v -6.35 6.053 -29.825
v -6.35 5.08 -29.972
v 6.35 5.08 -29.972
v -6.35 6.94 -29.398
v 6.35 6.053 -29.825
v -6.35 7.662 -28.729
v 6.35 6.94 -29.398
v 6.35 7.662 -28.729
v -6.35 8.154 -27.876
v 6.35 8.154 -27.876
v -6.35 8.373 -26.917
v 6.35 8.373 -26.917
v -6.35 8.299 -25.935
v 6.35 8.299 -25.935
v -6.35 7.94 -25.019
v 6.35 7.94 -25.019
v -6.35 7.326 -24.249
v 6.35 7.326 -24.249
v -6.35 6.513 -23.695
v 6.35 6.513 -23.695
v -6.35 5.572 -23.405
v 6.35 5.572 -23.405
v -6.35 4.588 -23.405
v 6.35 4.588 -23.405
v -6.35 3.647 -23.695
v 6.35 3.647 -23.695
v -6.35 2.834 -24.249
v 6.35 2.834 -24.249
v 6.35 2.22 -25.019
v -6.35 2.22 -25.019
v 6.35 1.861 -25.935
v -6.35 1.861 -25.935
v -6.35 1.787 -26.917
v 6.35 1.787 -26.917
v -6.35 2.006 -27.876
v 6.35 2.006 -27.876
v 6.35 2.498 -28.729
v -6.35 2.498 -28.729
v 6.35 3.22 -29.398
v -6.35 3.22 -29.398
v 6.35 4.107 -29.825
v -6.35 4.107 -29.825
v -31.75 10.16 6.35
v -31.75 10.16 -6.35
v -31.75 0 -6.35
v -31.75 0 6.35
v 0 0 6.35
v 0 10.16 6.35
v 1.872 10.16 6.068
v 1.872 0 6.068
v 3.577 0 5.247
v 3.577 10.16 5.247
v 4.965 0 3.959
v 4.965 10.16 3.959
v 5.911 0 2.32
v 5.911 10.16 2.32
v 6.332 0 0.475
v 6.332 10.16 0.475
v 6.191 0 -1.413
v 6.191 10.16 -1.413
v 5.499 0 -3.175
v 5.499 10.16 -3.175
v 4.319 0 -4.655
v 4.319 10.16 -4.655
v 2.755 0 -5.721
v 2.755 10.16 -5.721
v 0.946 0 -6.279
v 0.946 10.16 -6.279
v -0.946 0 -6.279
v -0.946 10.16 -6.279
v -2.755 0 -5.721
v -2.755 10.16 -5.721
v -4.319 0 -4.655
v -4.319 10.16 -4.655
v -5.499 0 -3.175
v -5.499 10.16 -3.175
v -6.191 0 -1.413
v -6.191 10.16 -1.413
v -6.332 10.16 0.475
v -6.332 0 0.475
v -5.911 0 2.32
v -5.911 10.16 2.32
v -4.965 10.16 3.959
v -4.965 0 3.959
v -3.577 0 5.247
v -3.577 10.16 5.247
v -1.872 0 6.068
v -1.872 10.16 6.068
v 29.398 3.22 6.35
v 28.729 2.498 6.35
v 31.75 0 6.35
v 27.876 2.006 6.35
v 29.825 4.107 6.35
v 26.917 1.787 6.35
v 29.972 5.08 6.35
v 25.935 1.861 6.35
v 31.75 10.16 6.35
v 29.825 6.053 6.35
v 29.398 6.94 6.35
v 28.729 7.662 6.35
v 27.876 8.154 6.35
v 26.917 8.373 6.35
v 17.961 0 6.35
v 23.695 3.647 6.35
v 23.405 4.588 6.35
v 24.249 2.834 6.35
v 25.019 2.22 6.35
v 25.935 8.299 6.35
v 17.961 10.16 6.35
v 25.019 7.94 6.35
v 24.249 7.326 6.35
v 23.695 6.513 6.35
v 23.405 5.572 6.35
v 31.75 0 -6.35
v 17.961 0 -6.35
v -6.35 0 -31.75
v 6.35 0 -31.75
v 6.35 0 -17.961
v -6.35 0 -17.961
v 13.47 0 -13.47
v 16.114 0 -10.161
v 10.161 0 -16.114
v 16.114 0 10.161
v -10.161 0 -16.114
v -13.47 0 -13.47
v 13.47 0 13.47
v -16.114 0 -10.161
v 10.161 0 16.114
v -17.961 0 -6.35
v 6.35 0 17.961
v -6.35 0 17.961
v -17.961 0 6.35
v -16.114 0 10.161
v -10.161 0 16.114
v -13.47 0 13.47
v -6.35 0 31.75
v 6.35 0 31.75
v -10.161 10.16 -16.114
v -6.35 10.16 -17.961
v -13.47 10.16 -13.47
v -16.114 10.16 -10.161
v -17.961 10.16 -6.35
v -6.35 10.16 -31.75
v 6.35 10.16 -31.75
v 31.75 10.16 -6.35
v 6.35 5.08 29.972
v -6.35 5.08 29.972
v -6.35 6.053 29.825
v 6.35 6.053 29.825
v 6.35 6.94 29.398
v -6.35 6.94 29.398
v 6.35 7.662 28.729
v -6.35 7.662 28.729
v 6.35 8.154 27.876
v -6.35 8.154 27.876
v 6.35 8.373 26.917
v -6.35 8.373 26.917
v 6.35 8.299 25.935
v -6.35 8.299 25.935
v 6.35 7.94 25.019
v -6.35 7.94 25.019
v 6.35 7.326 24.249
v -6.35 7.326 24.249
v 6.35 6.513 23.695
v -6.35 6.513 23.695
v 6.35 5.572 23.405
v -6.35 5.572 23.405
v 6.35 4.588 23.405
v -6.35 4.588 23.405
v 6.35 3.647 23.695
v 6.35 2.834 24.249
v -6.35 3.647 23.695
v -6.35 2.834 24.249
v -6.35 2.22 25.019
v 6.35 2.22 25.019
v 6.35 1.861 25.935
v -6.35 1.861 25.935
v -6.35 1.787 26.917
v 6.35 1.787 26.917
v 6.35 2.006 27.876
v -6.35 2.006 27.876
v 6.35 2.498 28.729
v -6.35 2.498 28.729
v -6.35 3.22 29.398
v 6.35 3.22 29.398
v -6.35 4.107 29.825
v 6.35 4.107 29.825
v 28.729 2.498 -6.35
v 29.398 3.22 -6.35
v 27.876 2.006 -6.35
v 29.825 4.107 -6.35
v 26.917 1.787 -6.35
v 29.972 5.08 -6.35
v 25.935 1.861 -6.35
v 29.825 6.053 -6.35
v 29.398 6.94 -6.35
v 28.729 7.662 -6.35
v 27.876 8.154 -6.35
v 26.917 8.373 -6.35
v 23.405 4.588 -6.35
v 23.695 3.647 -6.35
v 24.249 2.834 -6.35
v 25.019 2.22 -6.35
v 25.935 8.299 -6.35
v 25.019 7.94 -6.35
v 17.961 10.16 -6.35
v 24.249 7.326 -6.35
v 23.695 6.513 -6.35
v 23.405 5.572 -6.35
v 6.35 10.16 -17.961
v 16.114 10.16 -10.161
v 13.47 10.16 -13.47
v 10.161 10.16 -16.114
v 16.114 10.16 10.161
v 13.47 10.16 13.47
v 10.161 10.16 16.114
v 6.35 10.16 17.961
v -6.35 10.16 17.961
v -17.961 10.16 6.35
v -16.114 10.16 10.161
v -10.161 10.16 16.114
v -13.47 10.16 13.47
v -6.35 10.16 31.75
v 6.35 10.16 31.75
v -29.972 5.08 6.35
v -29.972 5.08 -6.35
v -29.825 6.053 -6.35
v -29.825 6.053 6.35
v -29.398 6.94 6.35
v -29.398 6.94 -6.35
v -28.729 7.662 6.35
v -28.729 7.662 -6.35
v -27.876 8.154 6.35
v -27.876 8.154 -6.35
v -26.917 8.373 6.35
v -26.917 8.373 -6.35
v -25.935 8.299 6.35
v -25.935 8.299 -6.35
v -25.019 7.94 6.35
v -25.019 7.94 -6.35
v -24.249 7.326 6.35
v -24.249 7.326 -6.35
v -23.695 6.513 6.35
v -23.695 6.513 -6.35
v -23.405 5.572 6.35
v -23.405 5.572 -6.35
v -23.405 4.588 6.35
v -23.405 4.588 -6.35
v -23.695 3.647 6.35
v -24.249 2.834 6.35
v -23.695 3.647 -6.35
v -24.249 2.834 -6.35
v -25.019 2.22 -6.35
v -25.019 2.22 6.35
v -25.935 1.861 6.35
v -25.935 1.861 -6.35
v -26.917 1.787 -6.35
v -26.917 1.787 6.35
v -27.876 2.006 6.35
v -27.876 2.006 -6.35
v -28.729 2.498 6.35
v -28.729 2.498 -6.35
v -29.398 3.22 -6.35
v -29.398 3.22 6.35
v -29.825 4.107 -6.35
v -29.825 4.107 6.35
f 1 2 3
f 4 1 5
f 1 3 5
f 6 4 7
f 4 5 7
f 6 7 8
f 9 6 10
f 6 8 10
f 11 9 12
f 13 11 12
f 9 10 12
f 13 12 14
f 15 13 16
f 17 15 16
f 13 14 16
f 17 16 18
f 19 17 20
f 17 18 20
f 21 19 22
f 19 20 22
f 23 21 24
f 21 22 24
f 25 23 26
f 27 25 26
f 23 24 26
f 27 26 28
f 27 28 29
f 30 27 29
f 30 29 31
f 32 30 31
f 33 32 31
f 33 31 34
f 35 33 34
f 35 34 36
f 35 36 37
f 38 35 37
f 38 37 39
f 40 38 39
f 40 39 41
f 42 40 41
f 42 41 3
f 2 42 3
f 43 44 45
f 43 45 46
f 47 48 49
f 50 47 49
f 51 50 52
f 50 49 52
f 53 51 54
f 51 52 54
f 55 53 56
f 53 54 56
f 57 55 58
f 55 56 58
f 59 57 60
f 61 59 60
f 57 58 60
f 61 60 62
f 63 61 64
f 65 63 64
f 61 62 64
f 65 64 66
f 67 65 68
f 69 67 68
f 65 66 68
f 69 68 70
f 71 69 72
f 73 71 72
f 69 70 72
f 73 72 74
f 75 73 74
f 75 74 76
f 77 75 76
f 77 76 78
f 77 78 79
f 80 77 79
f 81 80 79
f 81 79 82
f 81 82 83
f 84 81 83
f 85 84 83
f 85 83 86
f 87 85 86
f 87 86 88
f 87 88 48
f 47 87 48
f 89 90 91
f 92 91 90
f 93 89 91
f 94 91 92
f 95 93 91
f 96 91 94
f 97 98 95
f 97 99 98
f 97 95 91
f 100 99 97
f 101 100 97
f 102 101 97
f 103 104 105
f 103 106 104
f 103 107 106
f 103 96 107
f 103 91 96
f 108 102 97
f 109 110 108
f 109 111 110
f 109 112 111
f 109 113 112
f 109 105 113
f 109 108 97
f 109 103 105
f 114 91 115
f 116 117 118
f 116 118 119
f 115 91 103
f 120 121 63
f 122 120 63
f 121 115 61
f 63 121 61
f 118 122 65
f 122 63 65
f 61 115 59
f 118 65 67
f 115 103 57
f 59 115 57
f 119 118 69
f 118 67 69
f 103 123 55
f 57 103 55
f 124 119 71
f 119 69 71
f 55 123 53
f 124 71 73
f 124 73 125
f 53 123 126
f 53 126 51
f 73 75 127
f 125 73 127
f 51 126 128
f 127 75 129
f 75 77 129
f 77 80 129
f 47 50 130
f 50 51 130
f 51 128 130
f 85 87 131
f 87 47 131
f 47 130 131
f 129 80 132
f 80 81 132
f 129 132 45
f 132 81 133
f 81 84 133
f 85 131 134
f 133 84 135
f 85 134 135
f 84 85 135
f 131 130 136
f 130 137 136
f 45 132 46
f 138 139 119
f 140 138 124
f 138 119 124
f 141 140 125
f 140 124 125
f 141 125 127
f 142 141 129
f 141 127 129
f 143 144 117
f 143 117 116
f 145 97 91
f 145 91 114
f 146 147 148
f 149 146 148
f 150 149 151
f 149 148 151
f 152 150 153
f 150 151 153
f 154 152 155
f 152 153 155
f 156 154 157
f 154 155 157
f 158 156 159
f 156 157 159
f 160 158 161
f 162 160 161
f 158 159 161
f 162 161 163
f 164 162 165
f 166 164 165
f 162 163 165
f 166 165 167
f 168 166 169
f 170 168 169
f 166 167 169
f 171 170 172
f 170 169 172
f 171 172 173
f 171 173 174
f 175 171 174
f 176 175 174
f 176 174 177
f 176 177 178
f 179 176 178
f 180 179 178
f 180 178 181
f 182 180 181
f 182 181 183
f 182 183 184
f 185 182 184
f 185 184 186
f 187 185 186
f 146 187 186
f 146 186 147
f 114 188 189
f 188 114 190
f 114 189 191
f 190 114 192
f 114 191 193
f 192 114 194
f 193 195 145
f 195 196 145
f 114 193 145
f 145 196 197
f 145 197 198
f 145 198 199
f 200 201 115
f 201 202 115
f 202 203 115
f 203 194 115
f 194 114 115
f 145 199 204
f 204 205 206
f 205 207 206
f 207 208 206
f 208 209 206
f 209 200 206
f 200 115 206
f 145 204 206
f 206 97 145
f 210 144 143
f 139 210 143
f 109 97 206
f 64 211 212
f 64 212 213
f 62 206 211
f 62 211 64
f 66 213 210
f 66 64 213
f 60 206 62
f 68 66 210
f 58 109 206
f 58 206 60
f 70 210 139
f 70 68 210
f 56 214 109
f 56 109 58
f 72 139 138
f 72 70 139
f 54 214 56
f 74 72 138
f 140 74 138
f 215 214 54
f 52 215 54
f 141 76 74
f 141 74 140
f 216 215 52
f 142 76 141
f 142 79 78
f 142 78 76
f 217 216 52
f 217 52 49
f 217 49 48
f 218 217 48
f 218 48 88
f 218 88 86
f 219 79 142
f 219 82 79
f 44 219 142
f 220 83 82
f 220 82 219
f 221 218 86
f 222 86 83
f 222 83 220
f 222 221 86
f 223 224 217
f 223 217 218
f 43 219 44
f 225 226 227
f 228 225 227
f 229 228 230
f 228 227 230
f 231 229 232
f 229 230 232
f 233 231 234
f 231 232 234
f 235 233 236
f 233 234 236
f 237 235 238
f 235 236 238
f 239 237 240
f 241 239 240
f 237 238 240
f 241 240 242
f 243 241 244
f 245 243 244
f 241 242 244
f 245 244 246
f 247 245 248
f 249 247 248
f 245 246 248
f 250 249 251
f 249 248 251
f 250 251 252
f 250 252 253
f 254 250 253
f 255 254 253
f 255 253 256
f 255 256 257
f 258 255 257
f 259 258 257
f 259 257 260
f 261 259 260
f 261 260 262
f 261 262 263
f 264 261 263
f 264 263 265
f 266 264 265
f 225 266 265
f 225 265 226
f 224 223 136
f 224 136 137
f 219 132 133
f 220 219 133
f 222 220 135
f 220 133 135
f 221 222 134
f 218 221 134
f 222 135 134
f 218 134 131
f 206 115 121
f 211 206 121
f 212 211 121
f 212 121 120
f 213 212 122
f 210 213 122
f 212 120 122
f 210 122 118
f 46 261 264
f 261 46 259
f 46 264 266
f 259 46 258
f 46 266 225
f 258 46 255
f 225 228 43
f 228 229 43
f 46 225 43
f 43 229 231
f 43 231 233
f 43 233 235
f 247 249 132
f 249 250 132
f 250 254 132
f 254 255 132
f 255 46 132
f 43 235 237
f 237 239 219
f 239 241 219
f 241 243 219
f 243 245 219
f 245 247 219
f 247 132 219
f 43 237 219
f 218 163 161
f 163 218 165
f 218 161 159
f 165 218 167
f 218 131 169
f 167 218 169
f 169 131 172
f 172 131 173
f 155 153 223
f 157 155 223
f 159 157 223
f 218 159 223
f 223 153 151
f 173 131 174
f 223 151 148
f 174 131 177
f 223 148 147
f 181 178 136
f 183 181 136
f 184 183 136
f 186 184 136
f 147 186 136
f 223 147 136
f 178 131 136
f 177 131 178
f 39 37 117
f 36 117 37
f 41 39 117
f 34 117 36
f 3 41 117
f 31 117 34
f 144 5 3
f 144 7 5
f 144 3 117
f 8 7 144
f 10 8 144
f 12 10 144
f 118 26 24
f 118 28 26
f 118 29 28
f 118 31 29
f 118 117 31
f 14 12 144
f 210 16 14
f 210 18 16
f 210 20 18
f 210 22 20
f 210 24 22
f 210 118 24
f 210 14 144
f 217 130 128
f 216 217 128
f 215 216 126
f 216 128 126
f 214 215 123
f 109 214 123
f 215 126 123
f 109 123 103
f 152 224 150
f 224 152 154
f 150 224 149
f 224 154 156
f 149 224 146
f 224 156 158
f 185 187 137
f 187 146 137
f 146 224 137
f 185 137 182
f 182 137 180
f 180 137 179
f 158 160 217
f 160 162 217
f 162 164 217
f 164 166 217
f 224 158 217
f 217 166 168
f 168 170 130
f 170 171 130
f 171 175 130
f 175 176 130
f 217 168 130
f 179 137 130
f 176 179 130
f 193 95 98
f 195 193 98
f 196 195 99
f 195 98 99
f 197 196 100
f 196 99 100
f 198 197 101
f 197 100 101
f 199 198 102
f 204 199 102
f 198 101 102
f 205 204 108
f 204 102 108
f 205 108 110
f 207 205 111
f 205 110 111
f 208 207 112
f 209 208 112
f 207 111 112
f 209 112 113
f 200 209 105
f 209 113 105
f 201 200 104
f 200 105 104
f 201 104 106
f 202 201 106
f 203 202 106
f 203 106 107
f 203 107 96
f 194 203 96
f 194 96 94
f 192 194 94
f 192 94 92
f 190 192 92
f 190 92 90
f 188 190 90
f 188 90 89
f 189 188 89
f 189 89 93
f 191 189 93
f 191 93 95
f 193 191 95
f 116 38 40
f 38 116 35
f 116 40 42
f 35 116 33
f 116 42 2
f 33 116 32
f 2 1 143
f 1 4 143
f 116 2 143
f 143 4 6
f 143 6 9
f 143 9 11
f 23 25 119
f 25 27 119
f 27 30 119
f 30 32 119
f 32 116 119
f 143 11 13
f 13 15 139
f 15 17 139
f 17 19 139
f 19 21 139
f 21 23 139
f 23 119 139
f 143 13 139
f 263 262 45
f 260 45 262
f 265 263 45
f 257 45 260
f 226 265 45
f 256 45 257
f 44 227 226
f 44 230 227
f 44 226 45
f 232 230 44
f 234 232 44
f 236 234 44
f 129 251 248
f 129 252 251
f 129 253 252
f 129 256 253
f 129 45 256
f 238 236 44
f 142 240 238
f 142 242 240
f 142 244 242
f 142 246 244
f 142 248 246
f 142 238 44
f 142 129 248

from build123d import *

# Parameters (mm, degrees)
SKETCH1_R               = 19.05
BOSS_EXTRUDE1_DEPTH     = 10.16
SKETCH2_R               = 6.35
CUT_EXTRUDE1_DEPTH      = 15.494
SKETCH6_W               = 12.7
SKETCH6_H               = 12.7
BOSS_EXTRUDE6_DEPTH     = 10.16
BOSS_EXTRUDE7_START     = -10.16
BOSS_EXTRUDE7_DEPTH     = 10.16
CIRPATTERN7_START       = -6.35
CIRPATTERN7_OUTLINE_W   = 10.16
CIRPATTERN7_OUTLINE_H   = 12.7
CIRPATTERN7_DEPTH       = 12.7
CIRPATTERN7_START_2     = -19.05
CIRPATTERN7_2_OUTLINE_W = 10.16
CIRPATTERN7_2_OUTLINE_H = 12.7
CIRPATTERN7_2_DEPTH     = 1.089487758
CIRPATTERN7_START_3     = 17.960512242
CIRPATTERN7_3_OUTLINE_W = 10.16
CIRPATTERN7_3_OUTLINE_H = 12.7
CIRPATTERN7_3_DEPTH     = 1.089487758
SKETCH7_W               = 12.7
SKETCH7_H               = 10.16
BOSS_EXTRUDE9_DEPTH     = 12.7
SKETCH10_W              = 12.7
SKETCH10_H              = 10.16
BOSS_EXTRUDE10_DEPTH    = 12.7
SKETCH11_W              = 12.7
SKETCH11_H              = 10.16
BOSS_EXTRUDE11_DEPTH    = 12.7
SKETCH12_R              = 3.302
CUT_EXTRUDE3_DEPTH      = 16.256
CIRPATTERN8_COUNT       = 4


# Read off the part's stored shape, not the designer's step: CirPattern7
with BuildPart() as part:
    # Sketch1 → Boss-Extrude1 (new body)
    with BuildSketch(Plane(origin=(0, 0, 0), x_dir=(1, 0, 0), z_dir=(0, 1, 0))):
        with Locations(Location((0, 0, 0), (0, 0, 270))):
            Circle(SKETCH1_R)
    extrude(amount=BOSS_EXTRUDE1_DEPTH)

    # Sketch2 → Cut-Extrude1 (cut)
    with BuildSketch(Plane(origin=(0, 10.16, 0), x_dir=(1, 0, 0), z_dir=(0, 1, 0))):
        with Locations(Location((0, 0, 0), (0, 0, 270))):
            Circle(SKETCH2_R)
    extrude(amount=-CUT_EXTRUDE1_DEPTH, mode=Mode.SUBTRACT)



with BuildPart() as body_2:
    # Sketch6 → Boss-Extrude6 (new body)
    with BuildSketch(Plane(origin=(0, 10.16, 0), x_dir=(1, 0, 0), z_dir=(0, 1, 0))):
        with Locations((0, -25.4)):
            Rectangle(SKETCH6_W, SKETCH6_H)
    extrude(amount=-BOSS_EXTRUDE6_DEPTH)


with BuildPart() as part_1:
    add(part.part)

    add(body_2.part)  # Boss-Extrude7 merges body 2
    # Sketch6<4> → Boss-Extrude7 (add)
    with BuildSketch(Plane(origin=(0, 10.16, 0), x_dir=(1, 0, 0), z_dir=(0, 1, 0)).offset(BOSS_EXTRUDE7_START)):
        with BuildLine():
            Line((-6.35, -17.960512242), (-6.35, -19.05))
            Line((-6.35, -19.05), (0, -19.05))
            ThreePointArc((0, -19.05), (-3.221392695, -18.775652561), (-6.35, -17.960512242))
        make_face()
        with BuildLine():
            ThreePointArc((6.35, -17.960512242), (3.221392695, -18.775652561), (0, -19.05))
            Line((0, -19.05), (6.35, -19.05))
            Line((6.35, -19.05), (6.35, -17.960512242))
        make_face()
    extrude(amount=BOSS_EXTRUDE7_DEPTH)

    # CirPattern7 outline → CirPattern7 (add)
    with BuildSketch(Plane.YZ.offset(CIRPATTERN7_START)):
        with Locations((5.08, -12.7)):
            Rectangle(CIRPATTERN7_OUTLINE_W, CIRPATTERN7_OUTLINE_H)
    extrude(amount=CIRPATTERN7_DEPTH)

    # CirPattern7 2 outline → CirPattern7 2 (add)
    with BuildSketch(Plane.YZ.offset(CIRPATTERN7_START_2)):
        with Locations((5.08, 0)):
            Rectangle(CIRPATTERN7_2_OUTLINE_W, CIRPATTERN7_2_OUTLINE_H)
    extrude(amount=CIRPATTERN7_2_DEPTH)

    # CirPattern7 3 outline → CirPattern7 3 (add)
    with BuildSketch(Plane.YZ.offset(CIRPATTERN7_START_3)):
        with Locations((5.08, 0)):
            Rectangle(CIRPATTERN7_3_OUTLINE_W, CIRPATTERN7_3_OUTLINE_H)
    extrude(amount=CIRPATTERN7_3_DEPTH)

    # Sketch7 → Boss-Extrude9 (add)
    with BuildSketch(Plane.ZY.offset(19.05)):
        with Locations((0, 5.08)):
            Rectangle(SKETCH7_W, SKETCH7_H)
    extrude(amount=BOSS_EXTRUDE9_DEPTH)

    # Sketch10 → Boss-Extrude10 (add)
    with BuildSketch(Plane(origin=(19.05, 0, 0), x_dir=(0, 0, -1), z_dir=(1, 0, 0))):
        with Locations((0, 5.08)):
            Rectangle(SKETCH10_W, SKETCH10_H)
    extrude(amount=BOSS_EXTRUDE10_DEPTH)

    # Sketch11 → Boss-Extrude11 (add)
    with BuildSketch(Plane(origin=(0, 0, -19.05), x_dir=(-1, 0, 0), z_dir=(0, 0, -1))):
        with Locations((0, 5.08)):
            Rectangle(SKETCH11_W, SKETCH11_H)
    extrude(amount=BOSS_EXTRUDE11_DEPTH)

    # Sketch12 → Cut-Extrude3 (cut)
    with BuildSketch(Plane.XY.offset(6.35)):
        with Locations((26.67, 5.08)):
            Circle(SKETCH12_R)
    cut_extrude3 = extrude(amount=-CUT_EXTRUDE3_DEPTH, mode=Mode.SUBTRACT)

    # CirPattern8: Cut-Extrude3 ×4 about axis
    cirpattern8_axis = Axis((0, 0, 0), (0, -1, 0))
    for i in range(1, CIRPATTERN8_COUNT):
        add(cut_extrude3.rotate(cirpattern8_axis, i * 360 / CIRPATTERN8_COUNT), mode=Mode.SUBTRACT)


solid = part_1.part
